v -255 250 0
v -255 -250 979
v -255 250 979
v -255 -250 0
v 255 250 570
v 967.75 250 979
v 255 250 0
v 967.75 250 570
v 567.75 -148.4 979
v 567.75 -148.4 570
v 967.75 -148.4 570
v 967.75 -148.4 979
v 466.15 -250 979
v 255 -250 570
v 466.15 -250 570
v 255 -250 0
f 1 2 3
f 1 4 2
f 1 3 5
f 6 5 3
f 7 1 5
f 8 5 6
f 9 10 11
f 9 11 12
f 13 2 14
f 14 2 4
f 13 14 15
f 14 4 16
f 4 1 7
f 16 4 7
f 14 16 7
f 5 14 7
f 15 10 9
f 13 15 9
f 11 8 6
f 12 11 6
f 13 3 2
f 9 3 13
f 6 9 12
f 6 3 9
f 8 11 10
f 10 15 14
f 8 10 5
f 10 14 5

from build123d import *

# Parameters (mm, degrees)
SKIZZE7_W                       = 510
SKIZZE7_H                       = 500
AUFSATZ_LINEAR_AUSTRAGEN1_DEPTH = 979
SKIZZE8_W                       = 409
SKIZZE8_H                       = 398.4
AUFSATZ_LINEAR_AUSTRAGEN2_DEPTH = 1222.75
SKIZZE9_W                       = 409
SKIZZE9_H                       = 500
AUFSATZ_LINEAR_AUSTRAGEN3_DEPTH = 721.15
FORMSCHR_GE1_ANGLE              = 45


with BuildPart() as part:
    # Skizze7 → Aufsatz-Linear austragen1 (new body)
    with BuildSketch(Plane.XY):
        Rectangle(SKIZZE7_W, SKIZZE7_H)
    extrude(amount=AUFSATZ_LINEAR_AUSTRAGEN1_DEPTH)

    # Skizze8 → Aufsatz-Linear austragen2 (add)
    with BuildSketch(Plane.ZY.offset(255)):
        with Locations((774.5, 50.8)):
            Rectangle(SKIZZE8_W, SKIZZE8_H)
    extrude(amount=-AUFSATZ_LINEAR_AUSTRAGEN2_DEPTH)

    # Skizze9 → Aufsatz-Linear austragen3 (add)
    with BuildSketch(Plane.ZY.offset(255)):
        with Locations((774.5, 0)):
            Rectangle(SKIZZE9_W, SKIZZE9_H)
    extrude(amount=-AUFSATZ_LINEAR_AUSTRAGEN3_DEPTH)

    # Formschräge1
    formschr_ge1_faces = [part.faces().sort_by_distance(p)[0] for p in [
        (466.15, -199.2, 774.5),
    ]]
    draft(formschr_ge1_faces, Plane(origin=(-255, -250, 979), x_dir=(0, 0, -1), z_dir=(0, -1, 0)), FORMSCHR_GE1_ANGLE)


solid = part.part
